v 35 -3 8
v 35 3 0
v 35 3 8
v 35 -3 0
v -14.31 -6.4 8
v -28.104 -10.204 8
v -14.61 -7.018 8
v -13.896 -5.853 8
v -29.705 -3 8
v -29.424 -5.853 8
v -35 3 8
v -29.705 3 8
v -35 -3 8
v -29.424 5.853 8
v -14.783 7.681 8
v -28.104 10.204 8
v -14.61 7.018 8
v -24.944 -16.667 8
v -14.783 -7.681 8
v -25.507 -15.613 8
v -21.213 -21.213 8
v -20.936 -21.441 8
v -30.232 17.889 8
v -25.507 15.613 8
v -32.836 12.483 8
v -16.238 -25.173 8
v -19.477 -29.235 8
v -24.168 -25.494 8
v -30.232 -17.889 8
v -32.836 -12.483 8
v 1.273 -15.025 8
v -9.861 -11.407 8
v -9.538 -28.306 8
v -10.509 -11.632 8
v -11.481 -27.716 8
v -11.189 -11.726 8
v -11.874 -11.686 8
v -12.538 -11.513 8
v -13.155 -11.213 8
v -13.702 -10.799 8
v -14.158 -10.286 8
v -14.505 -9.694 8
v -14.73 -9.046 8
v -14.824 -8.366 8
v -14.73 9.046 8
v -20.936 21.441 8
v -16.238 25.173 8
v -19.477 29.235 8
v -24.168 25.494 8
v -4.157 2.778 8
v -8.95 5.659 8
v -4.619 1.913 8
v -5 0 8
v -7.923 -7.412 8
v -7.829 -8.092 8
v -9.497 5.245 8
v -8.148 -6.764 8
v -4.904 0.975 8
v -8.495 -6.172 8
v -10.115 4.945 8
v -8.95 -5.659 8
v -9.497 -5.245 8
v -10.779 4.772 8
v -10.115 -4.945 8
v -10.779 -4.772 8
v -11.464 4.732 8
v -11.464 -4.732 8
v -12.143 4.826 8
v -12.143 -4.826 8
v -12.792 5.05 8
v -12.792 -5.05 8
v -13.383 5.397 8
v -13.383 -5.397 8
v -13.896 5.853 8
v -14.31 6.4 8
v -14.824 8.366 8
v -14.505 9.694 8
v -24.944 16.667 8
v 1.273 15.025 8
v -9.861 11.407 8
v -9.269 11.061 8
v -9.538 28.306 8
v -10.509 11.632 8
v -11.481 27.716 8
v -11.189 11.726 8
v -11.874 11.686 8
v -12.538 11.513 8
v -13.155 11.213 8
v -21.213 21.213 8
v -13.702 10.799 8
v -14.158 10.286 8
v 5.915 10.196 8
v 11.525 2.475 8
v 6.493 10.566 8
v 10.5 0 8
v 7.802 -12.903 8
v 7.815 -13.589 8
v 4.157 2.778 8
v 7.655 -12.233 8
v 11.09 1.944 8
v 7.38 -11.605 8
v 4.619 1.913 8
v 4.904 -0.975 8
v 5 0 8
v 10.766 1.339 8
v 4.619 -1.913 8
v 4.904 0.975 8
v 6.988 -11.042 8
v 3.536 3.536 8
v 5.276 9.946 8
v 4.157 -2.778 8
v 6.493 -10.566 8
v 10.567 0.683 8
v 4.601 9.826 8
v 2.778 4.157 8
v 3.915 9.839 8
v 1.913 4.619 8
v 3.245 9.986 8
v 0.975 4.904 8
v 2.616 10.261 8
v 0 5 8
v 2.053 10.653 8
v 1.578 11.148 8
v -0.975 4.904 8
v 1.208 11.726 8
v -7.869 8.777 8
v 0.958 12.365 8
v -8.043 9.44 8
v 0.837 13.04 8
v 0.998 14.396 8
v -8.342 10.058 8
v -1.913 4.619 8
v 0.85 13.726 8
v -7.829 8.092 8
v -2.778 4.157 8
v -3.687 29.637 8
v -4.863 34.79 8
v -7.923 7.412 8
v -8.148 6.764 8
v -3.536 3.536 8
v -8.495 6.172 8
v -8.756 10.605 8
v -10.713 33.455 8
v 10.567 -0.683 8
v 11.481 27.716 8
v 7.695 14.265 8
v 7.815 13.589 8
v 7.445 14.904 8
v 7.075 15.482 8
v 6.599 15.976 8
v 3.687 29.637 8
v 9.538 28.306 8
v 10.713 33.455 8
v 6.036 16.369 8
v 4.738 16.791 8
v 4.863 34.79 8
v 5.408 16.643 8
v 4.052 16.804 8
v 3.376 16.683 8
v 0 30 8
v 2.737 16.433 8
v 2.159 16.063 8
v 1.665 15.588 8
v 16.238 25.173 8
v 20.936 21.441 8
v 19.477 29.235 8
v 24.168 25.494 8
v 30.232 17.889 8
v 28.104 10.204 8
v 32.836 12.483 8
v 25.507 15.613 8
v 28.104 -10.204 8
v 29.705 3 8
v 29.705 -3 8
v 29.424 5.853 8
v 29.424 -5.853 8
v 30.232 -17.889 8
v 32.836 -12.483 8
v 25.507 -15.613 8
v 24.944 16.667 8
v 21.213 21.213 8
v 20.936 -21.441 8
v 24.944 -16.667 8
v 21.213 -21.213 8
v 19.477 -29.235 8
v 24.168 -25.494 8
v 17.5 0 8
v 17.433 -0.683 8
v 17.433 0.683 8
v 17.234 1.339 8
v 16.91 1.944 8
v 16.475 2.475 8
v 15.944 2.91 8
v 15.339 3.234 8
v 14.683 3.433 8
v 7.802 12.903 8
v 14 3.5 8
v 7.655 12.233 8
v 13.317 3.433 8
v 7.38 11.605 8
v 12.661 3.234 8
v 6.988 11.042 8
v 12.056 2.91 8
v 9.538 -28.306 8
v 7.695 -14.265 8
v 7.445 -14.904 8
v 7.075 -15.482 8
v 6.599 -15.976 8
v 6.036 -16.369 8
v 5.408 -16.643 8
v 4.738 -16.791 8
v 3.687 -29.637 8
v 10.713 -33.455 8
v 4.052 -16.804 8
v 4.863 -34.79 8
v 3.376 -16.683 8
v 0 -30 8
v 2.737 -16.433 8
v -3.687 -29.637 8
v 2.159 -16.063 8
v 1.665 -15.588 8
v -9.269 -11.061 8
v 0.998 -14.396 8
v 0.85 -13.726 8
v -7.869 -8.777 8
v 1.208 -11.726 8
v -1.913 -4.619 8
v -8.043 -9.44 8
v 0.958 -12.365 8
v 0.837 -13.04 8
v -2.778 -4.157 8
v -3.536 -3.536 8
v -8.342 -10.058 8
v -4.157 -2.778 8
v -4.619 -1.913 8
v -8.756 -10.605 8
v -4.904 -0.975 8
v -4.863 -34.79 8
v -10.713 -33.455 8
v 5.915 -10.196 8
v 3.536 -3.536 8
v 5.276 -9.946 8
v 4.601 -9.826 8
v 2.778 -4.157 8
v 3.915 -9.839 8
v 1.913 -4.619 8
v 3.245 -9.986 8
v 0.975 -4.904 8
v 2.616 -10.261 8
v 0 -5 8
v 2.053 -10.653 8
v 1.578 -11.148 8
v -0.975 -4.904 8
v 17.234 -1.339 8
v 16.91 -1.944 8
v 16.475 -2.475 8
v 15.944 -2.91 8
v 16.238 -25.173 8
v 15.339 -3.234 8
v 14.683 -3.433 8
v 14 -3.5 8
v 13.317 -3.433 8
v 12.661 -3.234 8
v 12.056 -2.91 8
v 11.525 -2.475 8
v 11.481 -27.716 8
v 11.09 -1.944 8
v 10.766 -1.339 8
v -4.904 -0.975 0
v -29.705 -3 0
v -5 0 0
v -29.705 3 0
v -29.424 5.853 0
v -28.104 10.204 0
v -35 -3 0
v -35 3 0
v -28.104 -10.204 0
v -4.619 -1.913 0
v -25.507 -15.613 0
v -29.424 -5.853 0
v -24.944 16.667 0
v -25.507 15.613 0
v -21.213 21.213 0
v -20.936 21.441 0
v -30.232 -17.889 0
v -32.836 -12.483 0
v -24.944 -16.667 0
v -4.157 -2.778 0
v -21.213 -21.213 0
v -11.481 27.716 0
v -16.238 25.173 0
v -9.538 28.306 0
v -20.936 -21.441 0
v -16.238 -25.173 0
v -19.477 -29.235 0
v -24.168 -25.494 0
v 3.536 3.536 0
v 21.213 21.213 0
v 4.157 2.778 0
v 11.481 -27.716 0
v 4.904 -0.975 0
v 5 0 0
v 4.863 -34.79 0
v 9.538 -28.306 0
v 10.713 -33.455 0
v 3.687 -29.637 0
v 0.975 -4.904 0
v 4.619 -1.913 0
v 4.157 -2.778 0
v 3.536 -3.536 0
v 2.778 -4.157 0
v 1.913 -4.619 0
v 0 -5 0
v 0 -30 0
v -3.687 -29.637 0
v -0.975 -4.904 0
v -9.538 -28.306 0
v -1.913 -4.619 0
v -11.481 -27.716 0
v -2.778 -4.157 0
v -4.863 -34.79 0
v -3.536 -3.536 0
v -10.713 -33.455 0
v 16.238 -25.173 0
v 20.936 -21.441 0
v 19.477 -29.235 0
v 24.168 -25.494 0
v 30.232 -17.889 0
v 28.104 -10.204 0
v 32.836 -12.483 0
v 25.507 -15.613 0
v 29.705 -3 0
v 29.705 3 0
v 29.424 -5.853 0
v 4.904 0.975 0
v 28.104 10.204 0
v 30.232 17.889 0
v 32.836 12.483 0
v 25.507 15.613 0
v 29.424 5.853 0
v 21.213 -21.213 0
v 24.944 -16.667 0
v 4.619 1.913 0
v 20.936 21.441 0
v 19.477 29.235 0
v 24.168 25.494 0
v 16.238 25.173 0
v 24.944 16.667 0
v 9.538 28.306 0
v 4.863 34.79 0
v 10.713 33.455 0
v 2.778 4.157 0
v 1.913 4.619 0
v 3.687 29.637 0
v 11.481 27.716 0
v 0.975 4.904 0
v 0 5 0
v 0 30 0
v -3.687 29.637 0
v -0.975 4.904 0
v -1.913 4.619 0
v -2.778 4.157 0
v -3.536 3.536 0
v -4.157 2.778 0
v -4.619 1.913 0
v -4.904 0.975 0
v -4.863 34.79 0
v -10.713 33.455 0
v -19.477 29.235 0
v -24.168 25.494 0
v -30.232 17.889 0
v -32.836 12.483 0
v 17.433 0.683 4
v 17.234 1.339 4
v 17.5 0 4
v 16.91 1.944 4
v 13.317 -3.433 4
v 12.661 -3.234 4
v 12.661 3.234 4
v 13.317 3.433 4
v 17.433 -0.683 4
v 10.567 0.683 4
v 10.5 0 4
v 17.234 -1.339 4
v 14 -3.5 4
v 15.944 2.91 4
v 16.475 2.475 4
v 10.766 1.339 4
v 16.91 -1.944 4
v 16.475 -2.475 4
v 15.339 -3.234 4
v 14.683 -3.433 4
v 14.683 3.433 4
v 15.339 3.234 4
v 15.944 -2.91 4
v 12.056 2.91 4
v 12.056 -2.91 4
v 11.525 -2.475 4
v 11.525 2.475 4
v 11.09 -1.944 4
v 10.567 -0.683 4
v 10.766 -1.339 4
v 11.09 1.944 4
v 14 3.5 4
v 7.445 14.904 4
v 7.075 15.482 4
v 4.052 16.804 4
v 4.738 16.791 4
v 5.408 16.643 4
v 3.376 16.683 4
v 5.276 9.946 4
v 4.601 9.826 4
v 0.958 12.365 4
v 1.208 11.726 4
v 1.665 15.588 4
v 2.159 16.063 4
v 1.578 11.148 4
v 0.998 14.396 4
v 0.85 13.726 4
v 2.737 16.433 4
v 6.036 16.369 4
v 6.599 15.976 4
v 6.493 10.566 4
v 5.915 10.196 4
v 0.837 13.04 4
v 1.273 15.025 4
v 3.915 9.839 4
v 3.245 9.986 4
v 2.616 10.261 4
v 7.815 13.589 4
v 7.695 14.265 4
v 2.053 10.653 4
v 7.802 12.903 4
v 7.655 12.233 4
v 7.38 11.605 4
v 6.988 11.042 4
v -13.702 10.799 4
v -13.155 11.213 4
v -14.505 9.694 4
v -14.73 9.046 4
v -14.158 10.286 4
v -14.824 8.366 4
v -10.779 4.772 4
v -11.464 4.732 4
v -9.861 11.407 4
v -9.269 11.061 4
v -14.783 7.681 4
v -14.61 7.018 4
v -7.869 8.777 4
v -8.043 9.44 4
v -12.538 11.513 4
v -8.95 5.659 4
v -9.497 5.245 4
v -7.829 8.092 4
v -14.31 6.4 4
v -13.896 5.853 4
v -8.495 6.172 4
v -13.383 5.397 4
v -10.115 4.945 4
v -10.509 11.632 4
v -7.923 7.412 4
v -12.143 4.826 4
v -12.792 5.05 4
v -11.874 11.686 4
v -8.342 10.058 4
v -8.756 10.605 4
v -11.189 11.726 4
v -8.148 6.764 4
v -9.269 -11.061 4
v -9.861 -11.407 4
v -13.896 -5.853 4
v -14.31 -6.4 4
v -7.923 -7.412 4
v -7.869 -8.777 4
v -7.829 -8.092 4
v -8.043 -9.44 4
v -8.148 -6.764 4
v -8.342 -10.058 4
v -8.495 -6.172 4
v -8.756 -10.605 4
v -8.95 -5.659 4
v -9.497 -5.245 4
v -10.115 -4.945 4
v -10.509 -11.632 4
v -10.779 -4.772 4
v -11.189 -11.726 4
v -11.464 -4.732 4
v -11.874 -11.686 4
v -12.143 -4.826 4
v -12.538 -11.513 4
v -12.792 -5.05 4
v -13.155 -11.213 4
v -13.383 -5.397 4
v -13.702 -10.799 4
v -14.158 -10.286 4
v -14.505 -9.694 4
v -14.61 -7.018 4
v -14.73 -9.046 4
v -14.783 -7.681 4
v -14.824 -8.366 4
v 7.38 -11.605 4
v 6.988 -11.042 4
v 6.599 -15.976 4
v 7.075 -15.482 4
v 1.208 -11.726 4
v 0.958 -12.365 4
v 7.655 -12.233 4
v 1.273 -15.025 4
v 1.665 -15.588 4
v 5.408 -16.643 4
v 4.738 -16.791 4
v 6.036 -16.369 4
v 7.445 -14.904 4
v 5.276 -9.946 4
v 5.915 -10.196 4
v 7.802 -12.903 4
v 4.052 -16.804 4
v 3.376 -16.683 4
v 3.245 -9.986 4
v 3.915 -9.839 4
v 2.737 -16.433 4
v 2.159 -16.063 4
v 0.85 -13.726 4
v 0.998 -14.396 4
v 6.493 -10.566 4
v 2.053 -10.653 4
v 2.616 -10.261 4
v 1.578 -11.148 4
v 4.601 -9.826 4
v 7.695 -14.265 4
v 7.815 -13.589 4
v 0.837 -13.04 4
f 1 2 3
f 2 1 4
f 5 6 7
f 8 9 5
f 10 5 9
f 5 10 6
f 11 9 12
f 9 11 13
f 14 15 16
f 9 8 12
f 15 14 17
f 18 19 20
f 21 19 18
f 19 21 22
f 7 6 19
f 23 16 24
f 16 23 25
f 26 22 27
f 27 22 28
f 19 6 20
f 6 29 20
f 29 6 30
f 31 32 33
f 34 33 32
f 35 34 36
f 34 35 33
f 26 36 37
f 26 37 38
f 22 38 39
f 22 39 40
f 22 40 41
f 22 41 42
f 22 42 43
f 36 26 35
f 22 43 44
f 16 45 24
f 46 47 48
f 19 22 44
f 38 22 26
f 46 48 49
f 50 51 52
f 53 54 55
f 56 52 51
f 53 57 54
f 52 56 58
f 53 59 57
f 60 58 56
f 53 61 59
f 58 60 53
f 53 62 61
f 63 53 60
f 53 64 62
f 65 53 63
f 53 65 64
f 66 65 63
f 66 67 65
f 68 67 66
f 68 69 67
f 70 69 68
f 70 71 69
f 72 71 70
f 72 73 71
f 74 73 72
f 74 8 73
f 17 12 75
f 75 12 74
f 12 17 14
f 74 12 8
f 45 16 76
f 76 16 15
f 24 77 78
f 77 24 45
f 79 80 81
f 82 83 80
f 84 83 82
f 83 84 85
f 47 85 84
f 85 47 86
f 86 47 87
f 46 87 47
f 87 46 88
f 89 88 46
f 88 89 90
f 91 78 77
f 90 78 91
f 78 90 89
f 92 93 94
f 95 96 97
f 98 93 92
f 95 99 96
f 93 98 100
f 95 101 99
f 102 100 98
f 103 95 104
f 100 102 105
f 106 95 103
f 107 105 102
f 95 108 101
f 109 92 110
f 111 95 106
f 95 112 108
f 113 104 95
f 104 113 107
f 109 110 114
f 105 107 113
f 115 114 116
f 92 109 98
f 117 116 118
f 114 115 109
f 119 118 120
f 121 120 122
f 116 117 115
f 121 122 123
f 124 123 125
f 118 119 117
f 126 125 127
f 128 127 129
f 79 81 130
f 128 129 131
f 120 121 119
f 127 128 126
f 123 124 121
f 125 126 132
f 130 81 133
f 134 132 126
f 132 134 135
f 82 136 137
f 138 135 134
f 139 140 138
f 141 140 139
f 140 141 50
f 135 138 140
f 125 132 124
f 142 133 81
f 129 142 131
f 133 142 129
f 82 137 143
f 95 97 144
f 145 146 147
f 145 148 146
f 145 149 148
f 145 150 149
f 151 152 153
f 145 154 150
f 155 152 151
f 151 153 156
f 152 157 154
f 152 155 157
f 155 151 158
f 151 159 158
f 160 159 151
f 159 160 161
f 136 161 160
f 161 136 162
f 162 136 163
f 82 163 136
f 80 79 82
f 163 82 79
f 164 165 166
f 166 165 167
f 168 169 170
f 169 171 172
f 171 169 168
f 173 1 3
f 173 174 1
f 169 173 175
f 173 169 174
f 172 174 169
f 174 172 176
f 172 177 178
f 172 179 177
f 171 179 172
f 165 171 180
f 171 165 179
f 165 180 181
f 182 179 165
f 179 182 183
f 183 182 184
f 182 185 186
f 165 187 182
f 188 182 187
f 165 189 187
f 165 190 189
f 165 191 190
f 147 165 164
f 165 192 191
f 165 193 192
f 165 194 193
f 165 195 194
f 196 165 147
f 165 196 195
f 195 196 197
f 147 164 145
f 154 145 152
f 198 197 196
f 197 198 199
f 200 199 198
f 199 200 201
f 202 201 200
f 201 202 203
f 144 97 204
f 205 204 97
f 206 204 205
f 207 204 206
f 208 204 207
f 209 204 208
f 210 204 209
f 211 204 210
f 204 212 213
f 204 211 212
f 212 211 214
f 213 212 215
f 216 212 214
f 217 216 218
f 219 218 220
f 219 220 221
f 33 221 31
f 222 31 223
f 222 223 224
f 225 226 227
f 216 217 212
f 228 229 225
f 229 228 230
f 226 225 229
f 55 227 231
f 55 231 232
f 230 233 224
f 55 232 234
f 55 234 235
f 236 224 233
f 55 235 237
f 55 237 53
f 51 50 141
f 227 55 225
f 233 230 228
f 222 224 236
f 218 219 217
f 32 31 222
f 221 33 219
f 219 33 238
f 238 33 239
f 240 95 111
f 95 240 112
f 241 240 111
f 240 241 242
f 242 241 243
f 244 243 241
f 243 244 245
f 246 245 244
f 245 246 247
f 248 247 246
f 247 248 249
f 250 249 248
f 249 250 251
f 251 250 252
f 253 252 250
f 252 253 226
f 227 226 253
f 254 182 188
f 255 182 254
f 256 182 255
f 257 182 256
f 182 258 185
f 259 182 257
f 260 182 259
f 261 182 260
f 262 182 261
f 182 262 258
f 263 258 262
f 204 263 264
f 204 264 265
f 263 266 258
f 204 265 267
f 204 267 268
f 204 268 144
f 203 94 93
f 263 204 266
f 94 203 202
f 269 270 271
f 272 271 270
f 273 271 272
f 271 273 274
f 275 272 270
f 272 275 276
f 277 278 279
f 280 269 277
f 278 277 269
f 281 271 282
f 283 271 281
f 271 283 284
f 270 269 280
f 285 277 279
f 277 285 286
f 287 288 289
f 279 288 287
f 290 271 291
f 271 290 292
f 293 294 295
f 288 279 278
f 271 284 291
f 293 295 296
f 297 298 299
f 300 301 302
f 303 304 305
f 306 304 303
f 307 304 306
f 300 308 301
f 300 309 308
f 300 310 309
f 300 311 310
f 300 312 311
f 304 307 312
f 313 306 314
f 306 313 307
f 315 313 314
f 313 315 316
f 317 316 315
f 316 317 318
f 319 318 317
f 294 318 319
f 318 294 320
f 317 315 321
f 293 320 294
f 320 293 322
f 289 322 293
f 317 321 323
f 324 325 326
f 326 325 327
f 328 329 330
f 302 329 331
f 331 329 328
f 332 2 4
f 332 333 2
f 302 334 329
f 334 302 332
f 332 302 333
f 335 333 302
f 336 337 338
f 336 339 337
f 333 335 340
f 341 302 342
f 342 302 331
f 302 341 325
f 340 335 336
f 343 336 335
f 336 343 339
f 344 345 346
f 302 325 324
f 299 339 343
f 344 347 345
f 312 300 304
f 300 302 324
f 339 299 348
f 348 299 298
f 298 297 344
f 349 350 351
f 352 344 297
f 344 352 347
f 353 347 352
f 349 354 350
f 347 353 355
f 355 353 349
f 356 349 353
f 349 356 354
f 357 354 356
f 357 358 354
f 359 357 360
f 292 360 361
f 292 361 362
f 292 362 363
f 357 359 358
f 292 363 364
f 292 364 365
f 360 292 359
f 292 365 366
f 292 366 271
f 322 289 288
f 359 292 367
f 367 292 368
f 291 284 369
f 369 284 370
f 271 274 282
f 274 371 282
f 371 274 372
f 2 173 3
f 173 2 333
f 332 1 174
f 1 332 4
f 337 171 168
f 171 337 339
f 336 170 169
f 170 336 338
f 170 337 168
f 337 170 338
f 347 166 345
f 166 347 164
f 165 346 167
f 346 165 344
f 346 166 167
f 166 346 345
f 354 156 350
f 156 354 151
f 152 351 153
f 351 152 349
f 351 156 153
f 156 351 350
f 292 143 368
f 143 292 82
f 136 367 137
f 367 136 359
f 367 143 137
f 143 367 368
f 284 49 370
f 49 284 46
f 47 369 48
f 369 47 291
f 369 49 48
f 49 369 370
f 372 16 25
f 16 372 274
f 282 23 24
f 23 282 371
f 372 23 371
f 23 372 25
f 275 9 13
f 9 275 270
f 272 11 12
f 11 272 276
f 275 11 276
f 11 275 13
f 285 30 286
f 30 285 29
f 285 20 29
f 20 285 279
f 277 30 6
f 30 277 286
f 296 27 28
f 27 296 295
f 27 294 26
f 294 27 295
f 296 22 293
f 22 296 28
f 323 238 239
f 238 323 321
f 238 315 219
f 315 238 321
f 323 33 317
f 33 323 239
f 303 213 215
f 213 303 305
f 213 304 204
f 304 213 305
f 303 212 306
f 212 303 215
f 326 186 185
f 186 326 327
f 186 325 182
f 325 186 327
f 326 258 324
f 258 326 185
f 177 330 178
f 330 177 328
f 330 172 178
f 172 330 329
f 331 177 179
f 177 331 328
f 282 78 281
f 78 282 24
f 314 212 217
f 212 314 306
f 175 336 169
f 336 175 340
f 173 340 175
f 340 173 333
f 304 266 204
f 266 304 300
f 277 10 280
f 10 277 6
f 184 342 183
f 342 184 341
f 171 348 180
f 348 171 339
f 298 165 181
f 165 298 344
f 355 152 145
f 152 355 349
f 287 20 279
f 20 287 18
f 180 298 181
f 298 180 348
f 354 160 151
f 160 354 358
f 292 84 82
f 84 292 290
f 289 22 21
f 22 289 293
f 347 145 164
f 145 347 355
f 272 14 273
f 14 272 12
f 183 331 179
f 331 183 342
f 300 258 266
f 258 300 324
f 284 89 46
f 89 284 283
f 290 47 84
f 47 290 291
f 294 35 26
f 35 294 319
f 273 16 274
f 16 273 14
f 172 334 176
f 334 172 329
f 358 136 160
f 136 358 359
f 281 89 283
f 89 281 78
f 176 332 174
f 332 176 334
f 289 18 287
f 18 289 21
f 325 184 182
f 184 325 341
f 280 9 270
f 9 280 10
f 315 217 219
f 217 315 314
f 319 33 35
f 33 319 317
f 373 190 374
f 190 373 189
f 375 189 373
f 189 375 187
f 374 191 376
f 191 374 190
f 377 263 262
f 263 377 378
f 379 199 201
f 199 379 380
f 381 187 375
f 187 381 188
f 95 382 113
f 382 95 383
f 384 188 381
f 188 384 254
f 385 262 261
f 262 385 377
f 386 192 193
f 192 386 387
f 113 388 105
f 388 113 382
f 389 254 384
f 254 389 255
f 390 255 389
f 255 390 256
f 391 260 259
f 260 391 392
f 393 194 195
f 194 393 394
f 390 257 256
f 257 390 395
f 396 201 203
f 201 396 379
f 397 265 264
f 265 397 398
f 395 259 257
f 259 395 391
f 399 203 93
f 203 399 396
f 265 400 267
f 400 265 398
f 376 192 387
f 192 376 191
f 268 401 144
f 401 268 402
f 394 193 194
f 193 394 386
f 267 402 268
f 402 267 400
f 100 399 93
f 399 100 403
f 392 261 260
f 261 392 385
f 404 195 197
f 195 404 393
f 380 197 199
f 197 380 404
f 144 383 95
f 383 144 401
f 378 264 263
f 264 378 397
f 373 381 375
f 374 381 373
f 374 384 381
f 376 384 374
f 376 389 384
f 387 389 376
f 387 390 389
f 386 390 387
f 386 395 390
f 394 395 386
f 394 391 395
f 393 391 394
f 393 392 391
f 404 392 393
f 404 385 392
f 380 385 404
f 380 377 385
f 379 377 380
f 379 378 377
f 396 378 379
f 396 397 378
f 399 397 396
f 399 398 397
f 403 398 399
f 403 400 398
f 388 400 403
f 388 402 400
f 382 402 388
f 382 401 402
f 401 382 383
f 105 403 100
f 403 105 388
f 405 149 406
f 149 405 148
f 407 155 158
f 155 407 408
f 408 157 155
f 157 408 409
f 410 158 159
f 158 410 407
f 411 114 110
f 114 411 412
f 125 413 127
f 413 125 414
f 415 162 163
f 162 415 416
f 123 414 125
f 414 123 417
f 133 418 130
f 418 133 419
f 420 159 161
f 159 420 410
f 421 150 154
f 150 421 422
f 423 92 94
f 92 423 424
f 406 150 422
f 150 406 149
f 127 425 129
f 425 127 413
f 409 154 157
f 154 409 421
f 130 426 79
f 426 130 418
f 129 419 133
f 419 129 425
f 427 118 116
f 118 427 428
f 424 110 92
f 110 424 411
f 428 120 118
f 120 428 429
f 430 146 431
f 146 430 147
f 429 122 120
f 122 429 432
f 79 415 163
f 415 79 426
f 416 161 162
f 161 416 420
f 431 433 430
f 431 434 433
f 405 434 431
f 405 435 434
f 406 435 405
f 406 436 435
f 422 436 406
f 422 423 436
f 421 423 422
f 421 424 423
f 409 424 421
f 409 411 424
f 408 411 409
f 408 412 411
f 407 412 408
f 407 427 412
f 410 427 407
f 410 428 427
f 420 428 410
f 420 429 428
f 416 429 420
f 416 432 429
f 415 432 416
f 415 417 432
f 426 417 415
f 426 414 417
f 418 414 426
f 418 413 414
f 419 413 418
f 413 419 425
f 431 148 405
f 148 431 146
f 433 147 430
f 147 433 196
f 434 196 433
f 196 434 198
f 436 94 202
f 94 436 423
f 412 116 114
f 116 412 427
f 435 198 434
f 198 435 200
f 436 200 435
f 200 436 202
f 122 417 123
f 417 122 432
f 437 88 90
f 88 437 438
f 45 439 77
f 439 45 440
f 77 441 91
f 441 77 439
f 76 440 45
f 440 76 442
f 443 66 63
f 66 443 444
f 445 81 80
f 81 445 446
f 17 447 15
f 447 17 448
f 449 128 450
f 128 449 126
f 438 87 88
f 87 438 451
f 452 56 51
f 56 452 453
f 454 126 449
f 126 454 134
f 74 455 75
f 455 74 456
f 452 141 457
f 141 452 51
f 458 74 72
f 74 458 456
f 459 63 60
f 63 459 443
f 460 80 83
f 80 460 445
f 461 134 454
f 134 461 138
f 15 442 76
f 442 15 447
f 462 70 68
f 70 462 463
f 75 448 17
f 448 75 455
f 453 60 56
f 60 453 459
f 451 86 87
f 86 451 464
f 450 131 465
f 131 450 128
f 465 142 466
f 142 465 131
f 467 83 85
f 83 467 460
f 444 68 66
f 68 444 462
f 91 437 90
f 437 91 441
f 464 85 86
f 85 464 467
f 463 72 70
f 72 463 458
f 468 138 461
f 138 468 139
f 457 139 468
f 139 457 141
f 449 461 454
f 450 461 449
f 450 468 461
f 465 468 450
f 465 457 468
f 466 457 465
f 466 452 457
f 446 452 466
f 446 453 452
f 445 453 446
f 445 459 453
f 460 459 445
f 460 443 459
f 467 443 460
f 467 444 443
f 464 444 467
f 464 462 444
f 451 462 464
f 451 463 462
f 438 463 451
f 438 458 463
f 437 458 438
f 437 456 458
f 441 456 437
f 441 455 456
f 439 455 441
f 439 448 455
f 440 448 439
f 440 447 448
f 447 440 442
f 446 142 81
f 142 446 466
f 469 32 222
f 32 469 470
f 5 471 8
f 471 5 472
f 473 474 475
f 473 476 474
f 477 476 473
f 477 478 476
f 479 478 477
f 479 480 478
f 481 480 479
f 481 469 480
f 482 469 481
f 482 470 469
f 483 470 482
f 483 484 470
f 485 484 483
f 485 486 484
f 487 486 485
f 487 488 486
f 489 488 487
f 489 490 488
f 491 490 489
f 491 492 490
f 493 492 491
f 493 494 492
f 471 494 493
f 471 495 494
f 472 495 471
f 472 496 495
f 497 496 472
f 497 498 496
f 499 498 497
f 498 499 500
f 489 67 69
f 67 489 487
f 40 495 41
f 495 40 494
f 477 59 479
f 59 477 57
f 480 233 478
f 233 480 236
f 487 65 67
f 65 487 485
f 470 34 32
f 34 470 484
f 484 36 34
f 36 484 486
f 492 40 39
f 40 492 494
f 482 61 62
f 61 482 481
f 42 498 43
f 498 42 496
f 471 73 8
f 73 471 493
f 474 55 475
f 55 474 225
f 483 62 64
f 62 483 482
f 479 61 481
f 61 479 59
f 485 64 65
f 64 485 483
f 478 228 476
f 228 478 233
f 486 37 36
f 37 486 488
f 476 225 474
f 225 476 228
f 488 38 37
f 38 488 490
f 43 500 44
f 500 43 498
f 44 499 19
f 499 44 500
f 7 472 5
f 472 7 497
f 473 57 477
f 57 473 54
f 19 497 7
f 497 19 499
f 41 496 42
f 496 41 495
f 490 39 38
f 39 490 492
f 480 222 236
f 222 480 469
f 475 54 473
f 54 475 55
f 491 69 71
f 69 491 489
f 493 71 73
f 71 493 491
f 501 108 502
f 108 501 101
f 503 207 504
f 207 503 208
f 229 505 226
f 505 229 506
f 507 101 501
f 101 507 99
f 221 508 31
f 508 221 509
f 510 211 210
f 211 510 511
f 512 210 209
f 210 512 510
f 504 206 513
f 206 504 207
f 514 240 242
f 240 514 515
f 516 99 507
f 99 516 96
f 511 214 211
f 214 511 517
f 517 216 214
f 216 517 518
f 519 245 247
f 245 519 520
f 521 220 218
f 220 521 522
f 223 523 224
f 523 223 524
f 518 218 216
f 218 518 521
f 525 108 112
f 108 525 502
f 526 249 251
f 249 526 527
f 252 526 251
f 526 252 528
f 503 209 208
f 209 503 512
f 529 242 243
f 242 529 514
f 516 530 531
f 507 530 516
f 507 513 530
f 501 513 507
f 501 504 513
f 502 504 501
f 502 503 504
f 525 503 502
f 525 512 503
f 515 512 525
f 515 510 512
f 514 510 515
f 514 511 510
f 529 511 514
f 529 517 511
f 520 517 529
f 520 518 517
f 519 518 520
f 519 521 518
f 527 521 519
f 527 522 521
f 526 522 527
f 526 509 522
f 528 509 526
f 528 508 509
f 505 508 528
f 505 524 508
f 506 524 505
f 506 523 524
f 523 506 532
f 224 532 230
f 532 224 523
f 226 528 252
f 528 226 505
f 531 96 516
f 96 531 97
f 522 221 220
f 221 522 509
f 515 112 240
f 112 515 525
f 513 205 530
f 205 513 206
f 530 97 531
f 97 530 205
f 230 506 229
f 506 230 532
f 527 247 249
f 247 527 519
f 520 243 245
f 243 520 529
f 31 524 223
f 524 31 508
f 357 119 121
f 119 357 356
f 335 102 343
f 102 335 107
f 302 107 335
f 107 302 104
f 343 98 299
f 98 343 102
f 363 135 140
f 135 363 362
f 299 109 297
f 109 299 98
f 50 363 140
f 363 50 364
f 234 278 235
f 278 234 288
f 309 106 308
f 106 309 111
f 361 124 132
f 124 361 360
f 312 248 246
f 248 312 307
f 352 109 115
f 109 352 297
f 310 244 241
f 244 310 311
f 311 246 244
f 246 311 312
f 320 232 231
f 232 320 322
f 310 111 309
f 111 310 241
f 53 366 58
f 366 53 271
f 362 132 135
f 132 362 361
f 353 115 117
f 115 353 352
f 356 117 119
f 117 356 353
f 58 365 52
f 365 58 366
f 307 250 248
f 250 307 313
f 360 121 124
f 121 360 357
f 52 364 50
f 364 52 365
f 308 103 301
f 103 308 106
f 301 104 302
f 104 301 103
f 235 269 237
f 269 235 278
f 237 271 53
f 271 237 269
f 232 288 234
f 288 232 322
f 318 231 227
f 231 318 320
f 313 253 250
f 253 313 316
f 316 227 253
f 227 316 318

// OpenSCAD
$fn = 32;

// ----------------------------------------------------------------------
// Spur blank: lightened gear blank
// ----------------------------------------------------------------------

// --- parameters (mm) ---
disc_r = 30;              // blank root radius
disc_t = 8;               // blank thickness
n_teeth = 14;             // stub tooth count
tooth_w = 6;              // tooth width at the root
tooth_h = 5;              // tooth height above the root
bore_r = 5;               // central bore radius
ring_r = 14;              // lightening pocket ring radius
pocket_r = 3.5;           // lightening pocket radius

out_r = disc_r + tooth_h;  // tip radius
bbox_x = 70.0;  // measured width over the teeth
bbox_y = 69.58;  // measured depth over the teeth

difference() {
union() {
  cylinder(r = disc_r, h = disc_t);
  for (i = [0 : n_teeth - 1])
    rotate([0, 0, i * 360 / n_teeth])
      translate([disc_r - 1, -tooth_w / 2, 0])
        cube([tooth_h + 1, tooth_w, disc_t]);
}
  translate([0, 0, -1]) cylinder(r = bore_r, h = disc_t + 2);
  for (i = [0 : 5])
    rotate([0, 0, i * 72])
      translate([ring_r, 0, disc_t - 4])
        cylinder(r = pocket_r, h = 5);
}
